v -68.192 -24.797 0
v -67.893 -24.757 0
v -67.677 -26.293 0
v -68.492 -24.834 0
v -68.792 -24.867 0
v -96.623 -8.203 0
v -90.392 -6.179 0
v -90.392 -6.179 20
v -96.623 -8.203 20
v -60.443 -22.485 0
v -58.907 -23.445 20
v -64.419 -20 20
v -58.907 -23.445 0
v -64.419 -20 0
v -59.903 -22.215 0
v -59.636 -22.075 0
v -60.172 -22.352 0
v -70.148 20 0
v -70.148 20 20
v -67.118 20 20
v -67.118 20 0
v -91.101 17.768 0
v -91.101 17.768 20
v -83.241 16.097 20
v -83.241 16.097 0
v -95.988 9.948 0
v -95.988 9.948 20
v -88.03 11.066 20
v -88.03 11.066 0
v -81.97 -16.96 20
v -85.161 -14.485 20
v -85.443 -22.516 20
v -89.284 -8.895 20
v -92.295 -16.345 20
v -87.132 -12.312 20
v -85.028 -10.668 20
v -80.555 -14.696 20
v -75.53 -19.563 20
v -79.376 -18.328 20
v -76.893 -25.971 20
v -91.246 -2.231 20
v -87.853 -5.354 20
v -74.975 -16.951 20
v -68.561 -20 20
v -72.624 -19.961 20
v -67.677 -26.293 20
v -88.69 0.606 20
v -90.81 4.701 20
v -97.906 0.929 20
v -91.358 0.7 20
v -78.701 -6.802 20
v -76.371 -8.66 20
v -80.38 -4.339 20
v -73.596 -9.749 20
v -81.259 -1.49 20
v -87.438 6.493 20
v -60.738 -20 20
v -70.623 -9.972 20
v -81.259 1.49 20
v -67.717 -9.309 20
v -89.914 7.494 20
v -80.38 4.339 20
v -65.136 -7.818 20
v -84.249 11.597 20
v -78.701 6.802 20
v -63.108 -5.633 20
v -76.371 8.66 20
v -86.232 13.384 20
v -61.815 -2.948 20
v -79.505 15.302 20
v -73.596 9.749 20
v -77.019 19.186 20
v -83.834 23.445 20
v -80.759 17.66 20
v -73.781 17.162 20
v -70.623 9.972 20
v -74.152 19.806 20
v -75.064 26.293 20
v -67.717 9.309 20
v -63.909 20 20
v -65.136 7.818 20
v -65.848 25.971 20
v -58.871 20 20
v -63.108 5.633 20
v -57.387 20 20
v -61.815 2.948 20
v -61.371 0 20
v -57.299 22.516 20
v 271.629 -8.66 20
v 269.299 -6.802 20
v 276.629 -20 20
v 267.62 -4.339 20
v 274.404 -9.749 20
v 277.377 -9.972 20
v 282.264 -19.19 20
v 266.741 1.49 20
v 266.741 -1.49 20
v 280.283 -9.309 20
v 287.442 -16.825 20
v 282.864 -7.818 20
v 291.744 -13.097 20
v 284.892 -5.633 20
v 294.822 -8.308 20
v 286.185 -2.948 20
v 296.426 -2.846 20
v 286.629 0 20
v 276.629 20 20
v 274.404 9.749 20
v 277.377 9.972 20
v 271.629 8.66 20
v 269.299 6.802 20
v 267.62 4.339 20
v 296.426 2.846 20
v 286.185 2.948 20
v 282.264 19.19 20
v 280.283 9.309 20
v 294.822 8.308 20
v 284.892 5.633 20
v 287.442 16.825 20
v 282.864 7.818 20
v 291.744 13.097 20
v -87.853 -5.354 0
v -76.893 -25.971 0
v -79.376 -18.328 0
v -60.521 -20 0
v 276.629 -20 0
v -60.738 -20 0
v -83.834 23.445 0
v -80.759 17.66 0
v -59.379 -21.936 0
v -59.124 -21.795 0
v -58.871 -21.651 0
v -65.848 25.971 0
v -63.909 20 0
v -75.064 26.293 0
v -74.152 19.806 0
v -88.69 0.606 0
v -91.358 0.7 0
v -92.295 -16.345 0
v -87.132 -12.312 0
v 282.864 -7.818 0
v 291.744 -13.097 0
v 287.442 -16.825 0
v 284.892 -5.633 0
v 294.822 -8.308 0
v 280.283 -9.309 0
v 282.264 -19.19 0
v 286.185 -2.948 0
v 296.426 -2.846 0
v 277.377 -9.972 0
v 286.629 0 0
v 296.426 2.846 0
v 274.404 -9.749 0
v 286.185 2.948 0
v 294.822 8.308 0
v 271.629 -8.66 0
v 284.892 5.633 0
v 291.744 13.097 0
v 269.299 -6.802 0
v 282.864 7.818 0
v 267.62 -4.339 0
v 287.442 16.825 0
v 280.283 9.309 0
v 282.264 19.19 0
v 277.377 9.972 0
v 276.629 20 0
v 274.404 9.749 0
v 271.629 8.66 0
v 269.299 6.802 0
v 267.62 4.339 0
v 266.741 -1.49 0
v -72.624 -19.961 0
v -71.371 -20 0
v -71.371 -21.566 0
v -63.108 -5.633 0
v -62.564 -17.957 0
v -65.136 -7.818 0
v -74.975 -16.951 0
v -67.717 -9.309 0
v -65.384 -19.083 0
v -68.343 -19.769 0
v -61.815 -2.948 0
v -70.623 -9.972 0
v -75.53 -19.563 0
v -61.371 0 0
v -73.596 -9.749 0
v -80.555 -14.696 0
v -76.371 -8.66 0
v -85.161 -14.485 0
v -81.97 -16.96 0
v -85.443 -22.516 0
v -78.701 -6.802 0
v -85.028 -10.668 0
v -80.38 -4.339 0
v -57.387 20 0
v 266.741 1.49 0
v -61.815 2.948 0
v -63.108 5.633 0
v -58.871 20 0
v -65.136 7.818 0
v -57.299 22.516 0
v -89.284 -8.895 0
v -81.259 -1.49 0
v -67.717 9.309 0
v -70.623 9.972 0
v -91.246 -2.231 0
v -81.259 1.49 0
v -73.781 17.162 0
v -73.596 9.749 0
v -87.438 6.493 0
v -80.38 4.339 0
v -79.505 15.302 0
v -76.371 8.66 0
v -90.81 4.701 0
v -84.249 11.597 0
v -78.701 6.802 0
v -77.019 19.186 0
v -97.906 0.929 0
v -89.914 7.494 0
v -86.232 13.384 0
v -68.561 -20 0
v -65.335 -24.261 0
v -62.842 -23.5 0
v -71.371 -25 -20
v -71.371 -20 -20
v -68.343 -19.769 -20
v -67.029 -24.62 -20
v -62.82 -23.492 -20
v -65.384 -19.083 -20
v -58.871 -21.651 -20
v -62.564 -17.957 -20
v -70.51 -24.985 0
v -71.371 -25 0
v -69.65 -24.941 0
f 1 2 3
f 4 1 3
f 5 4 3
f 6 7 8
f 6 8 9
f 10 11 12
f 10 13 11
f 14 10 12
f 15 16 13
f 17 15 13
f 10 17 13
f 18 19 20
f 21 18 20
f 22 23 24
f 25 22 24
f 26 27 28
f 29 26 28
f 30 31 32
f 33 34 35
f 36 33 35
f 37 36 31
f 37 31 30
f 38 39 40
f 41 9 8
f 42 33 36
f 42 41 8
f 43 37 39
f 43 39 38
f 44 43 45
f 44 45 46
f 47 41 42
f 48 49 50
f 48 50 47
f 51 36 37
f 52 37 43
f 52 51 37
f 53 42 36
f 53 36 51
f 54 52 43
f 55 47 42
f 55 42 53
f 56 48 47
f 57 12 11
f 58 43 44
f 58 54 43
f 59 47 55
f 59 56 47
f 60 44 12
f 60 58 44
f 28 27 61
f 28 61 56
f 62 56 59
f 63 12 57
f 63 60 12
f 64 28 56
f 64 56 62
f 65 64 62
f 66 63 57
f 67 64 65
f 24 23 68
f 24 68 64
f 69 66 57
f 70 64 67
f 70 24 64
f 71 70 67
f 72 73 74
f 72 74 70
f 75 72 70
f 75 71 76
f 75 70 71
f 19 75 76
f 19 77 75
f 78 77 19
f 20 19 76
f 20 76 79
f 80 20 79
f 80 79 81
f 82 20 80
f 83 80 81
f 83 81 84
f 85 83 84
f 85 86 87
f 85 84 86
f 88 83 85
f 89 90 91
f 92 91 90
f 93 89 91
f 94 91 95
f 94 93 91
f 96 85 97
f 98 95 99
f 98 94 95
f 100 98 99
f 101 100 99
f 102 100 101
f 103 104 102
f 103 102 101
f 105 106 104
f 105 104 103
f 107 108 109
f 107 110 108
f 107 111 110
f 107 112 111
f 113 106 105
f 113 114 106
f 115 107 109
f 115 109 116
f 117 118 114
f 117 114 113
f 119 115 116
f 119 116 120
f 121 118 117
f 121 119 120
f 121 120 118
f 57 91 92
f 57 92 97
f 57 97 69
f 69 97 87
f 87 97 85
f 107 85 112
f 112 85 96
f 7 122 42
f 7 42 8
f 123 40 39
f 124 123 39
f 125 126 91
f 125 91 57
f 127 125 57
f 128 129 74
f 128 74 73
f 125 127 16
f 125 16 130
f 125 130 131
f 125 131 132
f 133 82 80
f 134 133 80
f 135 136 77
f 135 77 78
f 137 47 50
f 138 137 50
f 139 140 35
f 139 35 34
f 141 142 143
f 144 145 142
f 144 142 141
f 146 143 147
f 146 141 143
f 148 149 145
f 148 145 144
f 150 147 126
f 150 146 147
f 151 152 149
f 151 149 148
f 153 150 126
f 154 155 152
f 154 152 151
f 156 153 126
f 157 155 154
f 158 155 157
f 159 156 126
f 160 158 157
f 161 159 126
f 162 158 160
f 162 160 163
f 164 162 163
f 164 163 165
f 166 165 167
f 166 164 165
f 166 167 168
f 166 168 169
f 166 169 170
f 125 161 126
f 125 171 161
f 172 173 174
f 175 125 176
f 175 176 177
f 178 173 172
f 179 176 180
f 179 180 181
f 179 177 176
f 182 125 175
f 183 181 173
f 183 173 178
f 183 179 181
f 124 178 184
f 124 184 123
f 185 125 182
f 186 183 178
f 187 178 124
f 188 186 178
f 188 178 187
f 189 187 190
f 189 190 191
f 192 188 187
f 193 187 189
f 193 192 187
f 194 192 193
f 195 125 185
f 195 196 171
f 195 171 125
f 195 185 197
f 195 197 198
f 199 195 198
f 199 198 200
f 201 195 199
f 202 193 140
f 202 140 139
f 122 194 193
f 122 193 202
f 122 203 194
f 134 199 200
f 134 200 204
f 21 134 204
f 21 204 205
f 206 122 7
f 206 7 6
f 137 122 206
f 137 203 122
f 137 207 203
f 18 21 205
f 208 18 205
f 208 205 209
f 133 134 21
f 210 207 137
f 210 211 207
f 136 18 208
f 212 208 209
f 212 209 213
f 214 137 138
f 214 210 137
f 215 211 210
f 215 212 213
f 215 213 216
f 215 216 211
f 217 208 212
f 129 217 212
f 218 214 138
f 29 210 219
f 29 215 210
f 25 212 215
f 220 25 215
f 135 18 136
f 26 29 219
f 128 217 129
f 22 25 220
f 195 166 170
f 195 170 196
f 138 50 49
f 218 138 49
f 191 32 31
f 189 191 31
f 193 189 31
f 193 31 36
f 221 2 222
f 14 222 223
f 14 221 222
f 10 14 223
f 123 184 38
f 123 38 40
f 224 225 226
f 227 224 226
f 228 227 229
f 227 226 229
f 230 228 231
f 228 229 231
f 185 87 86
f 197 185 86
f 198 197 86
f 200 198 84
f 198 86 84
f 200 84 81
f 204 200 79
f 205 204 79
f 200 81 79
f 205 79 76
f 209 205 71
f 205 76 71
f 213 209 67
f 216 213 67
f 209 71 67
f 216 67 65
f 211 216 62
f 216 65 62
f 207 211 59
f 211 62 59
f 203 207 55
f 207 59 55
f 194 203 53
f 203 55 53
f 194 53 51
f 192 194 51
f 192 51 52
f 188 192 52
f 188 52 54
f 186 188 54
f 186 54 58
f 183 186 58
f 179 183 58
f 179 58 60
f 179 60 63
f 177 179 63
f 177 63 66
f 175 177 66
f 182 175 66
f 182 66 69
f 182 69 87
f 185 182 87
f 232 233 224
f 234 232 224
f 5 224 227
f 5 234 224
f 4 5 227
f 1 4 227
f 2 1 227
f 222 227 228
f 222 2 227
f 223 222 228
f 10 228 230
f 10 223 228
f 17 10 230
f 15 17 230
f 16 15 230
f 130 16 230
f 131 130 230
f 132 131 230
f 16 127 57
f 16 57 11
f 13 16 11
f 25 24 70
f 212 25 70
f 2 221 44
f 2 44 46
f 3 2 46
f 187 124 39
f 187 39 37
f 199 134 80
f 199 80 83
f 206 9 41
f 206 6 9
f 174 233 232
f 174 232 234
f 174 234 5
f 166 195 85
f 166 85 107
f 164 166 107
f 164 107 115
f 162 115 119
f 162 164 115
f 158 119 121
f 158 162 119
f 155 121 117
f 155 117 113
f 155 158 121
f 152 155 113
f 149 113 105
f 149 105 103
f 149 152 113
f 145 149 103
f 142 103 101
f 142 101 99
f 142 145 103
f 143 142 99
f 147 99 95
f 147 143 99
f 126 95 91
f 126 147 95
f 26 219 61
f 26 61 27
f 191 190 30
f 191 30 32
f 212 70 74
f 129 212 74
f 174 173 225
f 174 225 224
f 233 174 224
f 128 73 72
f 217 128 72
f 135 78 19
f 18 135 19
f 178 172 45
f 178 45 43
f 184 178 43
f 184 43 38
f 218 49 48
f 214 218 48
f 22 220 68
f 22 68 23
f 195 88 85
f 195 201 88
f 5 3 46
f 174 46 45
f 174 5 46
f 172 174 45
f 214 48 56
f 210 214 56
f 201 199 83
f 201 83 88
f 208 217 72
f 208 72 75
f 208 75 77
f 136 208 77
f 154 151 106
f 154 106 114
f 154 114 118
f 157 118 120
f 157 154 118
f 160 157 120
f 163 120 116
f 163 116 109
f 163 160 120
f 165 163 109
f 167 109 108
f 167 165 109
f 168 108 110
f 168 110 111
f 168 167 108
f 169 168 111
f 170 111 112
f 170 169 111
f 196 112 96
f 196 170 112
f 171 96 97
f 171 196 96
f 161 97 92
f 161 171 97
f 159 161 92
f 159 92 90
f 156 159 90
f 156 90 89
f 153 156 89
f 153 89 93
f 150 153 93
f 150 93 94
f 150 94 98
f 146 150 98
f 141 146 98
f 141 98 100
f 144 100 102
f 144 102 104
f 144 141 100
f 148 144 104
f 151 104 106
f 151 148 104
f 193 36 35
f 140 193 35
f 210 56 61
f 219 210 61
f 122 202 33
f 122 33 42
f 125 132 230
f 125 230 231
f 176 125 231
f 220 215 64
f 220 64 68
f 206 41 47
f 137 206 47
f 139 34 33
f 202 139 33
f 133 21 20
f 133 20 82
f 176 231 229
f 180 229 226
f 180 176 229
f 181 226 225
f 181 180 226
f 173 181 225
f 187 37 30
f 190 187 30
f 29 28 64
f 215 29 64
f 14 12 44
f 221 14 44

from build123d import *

# Parameters (mm, degrees)
SKETCH1_R                = 10
BOSS_EXTRUDE1_DEPTH      = 20
BOSS_EXTRUDE2_DEPTH      = 20
BOSS_EXTRUDE3_DEPTH      = 10
BOSS_EXTRUDE3_DEPTH_BACK = 15
CUT_EXTRUDE1_DEPTH       = 20
CIRPATTERN1_COUNT        = 18
SKETCH11_R               = 10
CUT_EXTRUDE3_DEPTH       = 33
SKETCH12_R               = 10
CUT_EXTRUDE4_DEPTH       = 5


with BuildPart() as part:
    # Sketch1 → Boss-Extrude1 (new body)
    with BuildSketch(Plane.XY):
        with BuildLine():
            Line((-71.370560529, 20), (276.629439471, 20))
            ThreePointArc((276.629439471, 20), (296.629439471, 0), (276.629439471, -20))
            Line((276.629439471, -20), (-71.370560529, -20))
            ThreePointArc((-71.370560529, -20), (-91.370560529, 0), (-71.370560529, 20))
        make_face()
        with Locations((-71.370560529, 0)):
            Circle(SKETCH1_R, mode=Mode.SUBTRACT)
        with Locations((276.629439471, 0)):
            Circle(SKETCH1_R, mode=Mode.SUBTRACT)
    extrude(amount=BOSS_EXTRUDE1_DEPTH)

    # Sketch2 → Boss-Extrude2 (add)
    with BuildSketch(Plane(origin=(0, 0, 0), x_dir=(-1, 0, 0), z_dir=(0, 0, -1))):
        with BuildLine():
            Line((71.370560529, -20), (71.370560529, -25))
            ThreePointArc((71.370560529, -25), (64.900084402, -24.148145657), (58.870560529, -21.650635095))
            Line((58.870560529, -21.650635095), (62.564306071, -17.956889553))
            ThreePointArc((62.564306071, -17.956889553), (66.850482602, -19.482527955), (71.370560529, -20))
        make_face()
    extrude(amount=BOSS_EXTRUDE2_DEPTH)

    # Sketch6 → Boss-Extrude3 (add, two sides)
    with BuildSketch(Plane.XY.offset(15)) as boss_extrude3_sk:
        Polygon((-65.848114546, 25.970849484), (-62.185743951, 14.6961629), (-57.298605127, 22.515827849), (-57.713272426, 10.668483548), (-50.44638121, 16.345065077), (-54.888071406, 5.354027631), (-46.117922126, 8.20284623), (-54.050901831, -0.606203036), (-44.835303924, -0.928756935), (-55.302738705, -6.49331667), (-46.753229286, -9.948338305), (-58.492592027, -11.597240483), (-51.64036811, -17.768003255), (-63.235718409, -15.302365936), (-58.907259326, -23.444584784), (-68.960026809, -17.161800219), (-67.677408606, -26.293403383), (-74.97508115, -16.951268114), (-76.893006513, -25.970849484), (-80.555377108, -14.6961629), (-85.442515932, -22.515827849), (-85.027848633, -10.668483548), (-92.294739849, -16.345065077), (-87.853049653, -5.354027631), (-96.623198932, -8.20284623), (-88.690219228, 0.606203036), (-97.905817135, 0.928756935), (-87.438382354, 6.49331667), (-95.987891773, 9.948338305), (-84.248529032, 11.597240483), (-91.100752949, 17.768003255), (-79.50540265, 15.302365936), (-83.833861733, 23.444584784), (-73.78109425, 17.161800219), (-75.063712453, 26.293403383), (-67.766039909, 16.951268114), align=None)
    extrude(amount=BOSS_EXTRUDE3_DEPTH)
    extrude(boss_extrude3_sk.sketch, amount=-BOSS_EXTRUDE3_DEPTH_BACK)

    # Sketch10 → Cut-Extrude1 (cut)
    with BuildSketch(Plane.XY.offset(20)):
        with BuildLine():
            Line((-77.019410052, 19.185684743), (-73.78109425, 17.161800219))
            Line((-73.78109425, 17.161800219), (-74.152438156, 19.805583982))
            ThreePointArc((-74.152438156, 19.805583982), (-75.597303819, 19.548264403), (-77.019410052, 19.185684743))
        make_face()
    cut_extrude1 = extrude(amount=-CUT_EXTRUDE1_DEPTH, mode=Mode.SUBTRACT)

    # CirPattern1: Cut-Extrude1 ×18 about axis, 9 skipped
    cirpattern1_axis = Axis((-71.370560529, 0, 20), (0, 0, -1))
    add([cut_extrude1.rotate(cirpattern1_axis, i * 360 / CIRPATTERN1_COUNT) for i in range(1, CIRPATTERN1_COUNT) if i not in (1, 2, 3, 4, 5, 6, 7, 8, 9)], mode=Mode.SUBTRACT)

    # Sketch11 → Cut-Extrude3 (cut)
    with BuildSketch(Plane.XY.offset(25)):
        with Locations((-71.370560529, 0)):
            Circle(SKETCH11_R)
    extrude(amount=-CUT_EXTRUDE3_DEPTH, mode=Mode.SUBTRACT)

    # Sketch12 → Cut-Extrude4 (cut)
    with BuildSketch(Plane.XY.offset(25)):
        Polygon((-97.905817135, 0.928756935), (-88.690219228, 0.606203036), (-96.623198932, -8.20284623), (-87.853049653, -5.354027631), (-92.294739849, -16.345065077), (-85.027848633, -10.668483548), (-85.442515932, -22.515827849), (-80.555377108, -14.6961629), (-76.893006513, -25.970849484), (-74.97508115, -16.951268114), (-67.677408606, -26.293403383), (-68.960026809, -17.161800219), (-58.907259326, -23.444584784), (-63.235718409, -15.302365936), (-51.64036811, -17.768003255), (-58.492592027, -11.597240483), (-46.753229286, -9.948338305), (-55.302738705, -6.49331667), (-44.835303924, -0.928756935), (-54.050901831, -0.606203036), (-46.117922126, 8.20284623), (-54.888071406, 5.354027631), (-50.44638121, 16.345065077), (-57.713272426, 10.668483548), (-57.298605127, 22.515827849), (-62.185743951, 14.6961629), (-65.848114546, 25.970849484), (-67.766039909, 16.951268114), (-75.063712453, 26.293403383), (-73.78109425, 17.161800219), (-83.833861733, 23.444584784), (-79.50540265, 15.302365936), (-91.100752949, 17.768003255), (-84.248529032, 11.597240483), (-95.987891773, 9.948338305), (-87.438382354, 6.49331667), align=None)
        with Locations((-71.370560529, 0)):
            Circle(SKETCH12_R, mode=Mode.SUBTRACT)
    extrude(amount=-CUT_EXTRUDE4_DEPTH, mode=Mode.SUBTRACT)


solid = part.part
